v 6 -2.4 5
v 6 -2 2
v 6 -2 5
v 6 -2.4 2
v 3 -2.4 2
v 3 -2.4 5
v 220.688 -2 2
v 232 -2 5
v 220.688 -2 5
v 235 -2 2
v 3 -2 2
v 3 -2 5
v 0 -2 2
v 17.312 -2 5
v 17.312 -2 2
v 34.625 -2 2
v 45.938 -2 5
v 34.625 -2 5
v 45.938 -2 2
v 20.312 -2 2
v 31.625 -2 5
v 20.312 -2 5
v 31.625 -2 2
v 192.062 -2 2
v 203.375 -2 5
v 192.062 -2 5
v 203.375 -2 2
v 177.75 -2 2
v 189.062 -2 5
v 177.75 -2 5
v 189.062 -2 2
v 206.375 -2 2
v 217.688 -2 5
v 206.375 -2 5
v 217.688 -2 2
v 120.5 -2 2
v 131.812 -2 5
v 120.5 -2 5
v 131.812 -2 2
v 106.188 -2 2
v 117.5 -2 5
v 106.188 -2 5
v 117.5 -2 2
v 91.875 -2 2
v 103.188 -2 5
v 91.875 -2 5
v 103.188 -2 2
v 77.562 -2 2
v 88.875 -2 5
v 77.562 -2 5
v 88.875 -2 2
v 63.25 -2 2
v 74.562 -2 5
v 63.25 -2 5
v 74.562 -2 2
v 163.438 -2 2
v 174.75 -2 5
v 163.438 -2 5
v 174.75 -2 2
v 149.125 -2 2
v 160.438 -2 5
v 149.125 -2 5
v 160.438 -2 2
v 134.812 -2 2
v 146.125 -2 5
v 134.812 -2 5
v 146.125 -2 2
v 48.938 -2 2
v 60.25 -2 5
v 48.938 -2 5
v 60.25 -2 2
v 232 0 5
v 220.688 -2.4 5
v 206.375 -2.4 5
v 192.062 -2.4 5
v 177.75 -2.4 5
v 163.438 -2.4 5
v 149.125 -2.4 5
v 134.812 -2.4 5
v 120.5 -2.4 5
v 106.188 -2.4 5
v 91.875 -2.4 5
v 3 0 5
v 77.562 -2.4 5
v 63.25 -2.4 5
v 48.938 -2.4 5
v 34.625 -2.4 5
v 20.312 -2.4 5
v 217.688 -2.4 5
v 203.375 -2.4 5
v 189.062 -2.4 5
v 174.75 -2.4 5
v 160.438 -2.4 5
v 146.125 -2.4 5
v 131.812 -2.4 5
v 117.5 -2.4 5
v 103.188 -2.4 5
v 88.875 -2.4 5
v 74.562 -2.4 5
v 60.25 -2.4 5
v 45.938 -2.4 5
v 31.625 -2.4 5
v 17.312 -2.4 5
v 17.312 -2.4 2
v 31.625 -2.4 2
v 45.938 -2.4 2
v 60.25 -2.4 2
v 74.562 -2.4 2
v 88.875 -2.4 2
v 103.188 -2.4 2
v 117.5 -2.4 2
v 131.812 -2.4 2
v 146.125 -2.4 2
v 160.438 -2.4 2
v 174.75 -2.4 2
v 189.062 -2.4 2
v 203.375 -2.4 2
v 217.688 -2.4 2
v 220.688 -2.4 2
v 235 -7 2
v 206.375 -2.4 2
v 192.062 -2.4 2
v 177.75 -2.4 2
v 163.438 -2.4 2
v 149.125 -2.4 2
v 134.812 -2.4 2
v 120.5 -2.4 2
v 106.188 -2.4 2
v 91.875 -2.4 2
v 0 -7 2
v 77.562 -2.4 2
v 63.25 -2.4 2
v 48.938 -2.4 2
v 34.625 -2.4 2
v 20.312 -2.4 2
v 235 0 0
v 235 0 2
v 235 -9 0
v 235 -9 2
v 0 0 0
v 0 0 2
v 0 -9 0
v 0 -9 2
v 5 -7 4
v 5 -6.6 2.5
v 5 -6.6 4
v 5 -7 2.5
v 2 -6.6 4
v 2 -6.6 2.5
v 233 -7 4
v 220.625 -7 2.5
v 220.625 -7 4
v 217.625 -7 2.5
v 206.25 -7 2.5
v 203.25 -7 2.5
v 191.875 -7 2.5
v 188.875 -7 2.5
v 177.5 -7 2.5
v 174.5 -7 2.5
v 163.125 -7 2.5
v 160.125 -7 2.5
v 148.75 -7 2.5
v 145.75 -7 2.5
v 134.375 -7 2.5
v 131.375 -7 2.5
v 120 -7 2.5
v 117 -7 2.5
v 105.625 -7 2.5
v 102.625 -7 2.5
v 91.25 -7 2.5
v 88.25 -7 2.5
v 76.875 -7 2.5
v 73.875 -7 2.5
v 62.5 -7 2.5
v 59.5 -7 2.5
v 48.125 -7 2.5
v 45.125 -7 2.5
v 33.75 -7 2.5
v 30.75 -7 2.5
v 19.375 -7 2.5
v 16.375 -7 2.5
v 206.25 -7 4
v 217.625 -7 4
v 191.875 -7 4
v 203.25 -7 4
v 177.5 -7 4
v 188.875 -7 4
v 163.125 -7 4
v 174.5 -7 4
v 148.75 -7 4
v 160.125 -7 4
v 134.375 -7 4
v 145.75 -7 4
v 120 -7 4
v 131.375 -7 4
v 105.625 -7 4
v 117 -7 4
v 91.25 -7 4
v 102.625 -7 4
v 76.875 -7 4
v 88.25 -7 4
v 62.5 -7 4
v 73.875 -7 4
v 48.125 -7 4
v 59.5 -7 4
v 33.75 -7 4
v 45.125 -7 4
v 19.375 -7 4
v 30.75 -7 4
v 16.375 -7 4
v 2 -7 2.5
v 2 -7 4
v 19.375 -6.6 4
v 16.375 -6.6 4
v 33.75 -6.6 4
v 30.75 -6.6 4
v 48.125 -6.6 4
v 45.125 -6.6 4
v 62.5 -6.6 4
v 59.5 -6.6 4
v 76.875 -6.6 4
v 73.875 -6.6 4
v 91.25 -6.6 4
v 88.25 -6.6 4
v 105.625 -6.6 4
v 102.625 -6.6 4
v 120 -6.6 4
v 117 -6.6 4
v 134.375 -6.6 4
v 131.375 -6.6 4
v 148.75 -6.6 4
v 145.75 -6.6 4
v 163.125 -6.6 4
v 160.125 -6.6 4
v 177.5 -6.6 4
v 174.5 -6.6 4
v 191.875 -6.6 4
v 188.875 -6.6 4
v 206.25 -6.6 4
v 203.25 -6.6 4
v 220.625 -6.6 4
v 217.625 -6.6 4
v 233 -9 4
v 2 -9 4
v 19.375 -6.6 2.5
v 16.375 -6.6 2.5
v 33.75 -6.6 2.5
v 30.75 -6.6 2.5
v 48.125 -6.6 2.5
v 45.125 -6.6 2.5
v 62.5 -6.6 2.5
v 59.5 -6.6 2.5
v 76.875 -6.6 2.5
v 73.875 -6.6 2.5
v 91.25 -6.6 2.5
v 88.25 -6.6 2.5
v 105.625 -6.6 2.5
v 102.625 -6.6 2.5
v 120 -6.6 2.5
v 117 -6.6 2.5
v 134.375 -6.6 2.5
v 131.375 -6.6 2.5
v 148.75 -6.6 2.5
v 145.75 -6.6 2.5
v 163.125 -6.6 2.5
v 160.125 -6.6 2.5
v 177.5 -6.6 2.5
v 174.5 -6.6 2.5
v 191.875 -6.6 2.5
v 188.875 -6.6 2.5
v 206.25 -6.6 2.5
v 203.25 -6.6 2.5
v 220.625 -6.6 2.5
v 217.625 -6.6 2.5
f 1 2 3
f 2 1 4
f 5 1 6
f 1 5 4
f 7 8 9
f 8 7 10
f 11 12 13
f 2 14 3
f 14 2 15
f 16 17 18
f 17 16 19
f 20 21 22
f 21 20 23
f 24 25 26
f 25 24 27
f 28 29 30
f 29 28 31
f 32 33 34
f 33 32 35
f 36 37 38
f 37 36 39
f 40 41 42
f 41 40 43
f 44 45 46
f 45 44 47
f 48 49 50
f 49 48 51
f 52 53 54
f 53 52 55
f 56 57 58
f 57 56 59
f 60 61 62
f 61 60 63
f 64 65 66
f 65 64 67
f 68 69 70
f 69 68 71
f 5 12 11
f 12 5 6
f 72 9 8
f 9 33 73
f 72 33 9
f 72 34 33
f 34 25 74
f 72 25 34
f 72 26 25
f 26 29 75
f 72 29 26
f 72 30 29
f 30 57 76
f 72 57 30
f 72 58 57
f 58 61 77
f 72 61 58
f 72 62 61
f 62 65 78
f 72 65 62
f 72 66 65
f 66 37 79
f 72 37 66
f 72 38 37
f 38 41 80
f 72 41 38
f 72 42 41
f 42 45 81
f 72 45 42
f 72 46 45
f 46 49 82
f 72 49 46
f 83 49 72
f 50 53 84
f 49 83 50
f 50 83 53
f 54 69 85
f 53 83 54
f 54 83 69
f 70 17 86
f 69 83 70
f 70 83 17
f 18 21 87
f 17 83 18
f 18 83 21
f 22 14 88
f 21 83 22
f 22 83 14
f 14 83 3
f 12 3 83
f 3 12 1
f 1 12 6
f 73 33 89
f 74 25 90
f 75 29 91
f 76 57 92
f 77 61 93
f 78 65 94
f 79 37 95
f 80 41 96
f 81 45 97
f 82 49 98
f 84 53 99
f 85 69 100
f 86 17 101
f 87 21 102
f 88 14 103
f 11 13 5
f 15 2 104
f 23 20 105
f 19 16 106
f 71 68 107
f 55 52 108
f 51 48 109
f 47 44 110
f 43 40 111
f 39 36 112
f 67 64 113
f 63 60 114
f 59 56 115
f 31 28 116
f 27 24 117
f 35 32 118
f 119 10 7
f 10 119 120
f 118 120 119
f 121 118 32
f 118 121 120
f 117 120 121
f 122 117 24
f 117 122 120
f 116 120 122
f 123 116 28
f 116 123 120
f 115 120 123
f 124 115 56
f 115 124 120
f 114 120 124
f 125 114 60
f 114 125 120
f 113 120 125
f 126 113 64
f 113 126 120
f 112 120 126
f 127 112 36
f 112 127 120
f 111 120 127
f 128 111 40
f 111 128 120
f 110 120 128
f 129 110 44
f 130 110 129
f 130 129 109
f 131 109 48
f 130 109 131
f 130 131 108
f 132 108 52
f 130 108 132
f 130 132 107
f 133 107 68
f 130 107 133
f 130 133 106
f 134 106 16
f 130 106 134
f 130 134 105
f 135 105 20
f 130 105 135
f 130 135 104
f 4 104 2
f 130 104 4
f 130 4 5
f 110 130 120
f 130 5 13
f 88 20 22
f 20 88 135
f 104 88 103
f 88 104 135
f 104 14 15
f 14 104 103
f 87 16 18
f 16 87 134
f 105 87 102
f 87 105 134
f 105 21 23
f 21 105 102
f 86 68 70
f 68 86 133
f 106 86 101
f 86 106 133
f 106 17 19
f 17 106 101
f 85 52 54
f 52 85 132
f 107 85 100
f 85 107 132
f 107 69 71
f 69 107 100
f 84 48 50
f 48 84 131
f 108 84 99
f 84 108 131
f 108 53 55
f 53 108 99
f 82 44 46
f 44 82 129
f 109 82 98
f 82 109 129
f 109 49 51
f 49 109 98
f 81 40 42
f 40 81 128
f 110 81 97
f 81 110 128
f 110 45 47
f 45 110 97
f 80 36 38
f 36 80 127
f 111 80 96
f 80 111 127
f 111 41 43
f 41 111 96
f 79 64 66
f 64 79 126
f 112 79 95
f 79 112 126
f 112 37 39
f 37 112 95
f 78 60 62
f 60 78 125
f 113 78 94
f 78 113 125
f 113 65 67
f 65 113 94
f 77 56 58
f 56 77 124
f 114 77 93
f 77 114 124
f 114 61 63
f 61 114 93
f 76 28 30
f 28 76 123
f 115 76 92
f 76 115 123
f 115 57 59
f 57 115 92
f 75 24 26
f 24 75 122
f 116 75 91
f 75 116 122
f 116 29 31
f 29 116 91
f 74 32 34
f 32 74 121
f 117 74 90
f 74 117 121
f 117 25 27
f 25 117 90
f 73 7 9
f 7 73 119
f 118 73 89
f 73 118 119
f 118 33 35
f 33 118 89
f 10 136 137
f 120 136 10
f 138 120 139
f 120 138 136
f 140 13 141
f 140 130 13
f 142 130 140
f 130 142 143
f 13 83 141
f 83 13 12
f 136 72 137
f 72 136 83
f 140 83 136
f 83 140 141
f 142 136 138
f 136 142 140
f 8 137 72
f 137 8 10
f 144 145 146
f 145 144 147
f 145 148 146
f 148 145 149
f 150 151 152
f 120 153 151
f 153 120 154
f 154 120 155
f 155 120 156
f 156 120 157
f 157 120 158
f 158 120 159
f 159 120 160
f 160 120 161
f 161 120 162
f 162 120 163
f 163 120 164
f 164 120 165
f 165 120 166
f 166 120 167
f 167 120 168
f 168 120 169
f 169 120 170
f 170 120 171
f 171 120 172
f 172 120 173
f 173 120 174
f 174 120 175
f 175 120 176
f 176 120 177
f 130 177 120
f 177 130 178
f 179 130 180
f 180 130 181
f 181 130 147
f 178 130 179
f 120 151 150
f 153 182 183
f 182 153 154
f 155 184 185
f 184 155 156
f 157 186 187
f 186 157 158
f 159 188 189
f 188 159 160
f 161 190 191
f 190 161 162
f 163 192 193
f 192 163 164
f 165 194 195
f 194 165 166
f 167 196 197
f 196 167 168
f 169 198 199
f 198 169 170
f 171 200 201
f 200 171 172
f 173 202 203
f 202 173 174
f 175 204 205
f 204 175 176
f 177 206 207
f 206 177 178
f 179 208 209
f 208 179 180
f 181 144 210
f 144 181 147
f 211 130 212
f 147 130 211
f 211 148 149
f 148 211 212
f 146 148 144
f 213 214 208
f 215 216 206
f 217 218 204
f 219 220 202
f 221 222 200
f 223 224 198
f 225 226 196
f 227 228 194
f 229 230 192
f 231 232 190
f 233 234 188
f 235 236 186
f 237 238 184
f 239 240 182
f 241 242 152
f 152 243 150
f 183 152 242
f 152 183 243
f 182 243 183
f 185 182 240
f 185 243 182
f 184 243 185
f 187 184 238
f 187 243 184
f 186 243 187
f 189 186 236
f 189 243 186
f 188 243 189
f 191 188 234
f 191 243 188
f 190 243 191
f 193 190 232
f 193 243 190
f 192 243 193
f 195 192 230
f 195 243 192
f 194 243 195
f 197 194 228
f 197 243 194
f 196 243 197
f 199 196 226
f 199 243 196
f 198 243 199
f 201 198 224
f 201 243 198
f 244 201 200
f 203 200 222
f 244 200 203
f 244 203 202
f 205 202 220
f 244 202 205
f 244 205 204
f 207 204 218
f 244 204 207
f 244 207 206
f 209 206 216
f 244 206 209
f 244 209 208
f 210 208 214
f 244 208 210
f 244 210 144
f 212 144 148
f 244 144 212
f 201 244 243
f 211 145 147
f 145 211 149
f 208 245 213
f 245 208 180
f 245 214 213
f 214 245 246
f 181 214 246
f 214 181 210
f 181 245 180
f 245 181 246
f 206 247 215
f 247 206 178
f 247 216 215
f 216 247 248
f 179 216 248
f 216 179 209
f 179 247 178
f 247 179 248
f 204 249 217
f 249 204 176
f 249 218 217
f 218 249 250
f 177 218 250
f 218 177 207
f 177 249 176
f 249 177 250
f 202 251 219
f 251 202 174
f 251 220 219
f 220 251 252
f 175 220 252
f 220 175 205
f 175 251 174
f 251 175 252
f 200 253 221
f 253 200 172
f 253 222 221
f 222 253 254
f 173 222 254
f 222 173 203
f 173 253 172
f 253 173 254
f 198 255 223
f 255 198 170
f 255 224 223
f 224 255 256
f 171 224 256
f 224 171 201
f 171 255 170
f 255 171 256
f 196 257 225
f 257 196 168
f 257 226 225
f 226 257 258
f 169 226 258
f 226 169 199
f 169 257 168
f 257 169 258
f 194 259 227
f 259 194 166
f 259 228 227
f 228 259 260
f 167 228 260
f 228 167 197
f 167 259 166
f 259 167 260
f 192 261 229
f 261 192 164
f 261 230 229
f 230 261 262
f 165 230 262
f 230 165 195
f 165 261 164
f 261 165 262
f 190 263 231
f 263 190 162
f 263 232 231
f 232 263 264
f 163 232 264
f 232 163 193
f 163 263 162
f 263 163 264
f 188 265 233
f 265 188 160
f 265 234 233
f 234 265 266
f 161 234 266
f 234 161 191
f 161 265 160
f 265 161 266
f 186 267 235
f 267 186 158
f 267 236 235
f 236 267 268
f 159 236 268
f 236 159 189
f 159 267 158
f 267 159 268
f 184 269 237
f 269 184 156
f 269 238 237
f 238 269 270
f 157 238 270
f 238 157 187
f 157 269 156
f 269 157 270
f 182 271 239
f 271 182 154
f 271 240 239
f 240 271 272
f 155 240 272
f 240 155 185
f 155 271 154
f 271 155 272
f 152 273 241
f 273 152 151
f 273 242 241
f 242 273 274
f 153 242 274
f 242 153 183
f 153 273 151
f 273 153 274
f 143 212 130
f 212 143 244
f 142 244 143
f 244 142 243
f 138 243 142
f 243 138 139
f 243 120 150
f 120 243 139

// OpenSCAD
length = 235;
thickness = 2;
depth = 3;
inner_height = 7;

grooves = 16;
groove_height = 0.40;
groove_length = 3;

module flat_bar(length, thickness, depth, grooves, groove_depth, groove_length, groove_height) {
    linear_extrude(height = thickness, slices=0, convexity = 0) {
        polygon([
            [0,0], [0, thickness], [depth, depth + thickness],
            [length - depth, depth + thickness], [length, thickness], [length, 0]
        ]);
    }
    

    for (x = [depth : (length - depth - groove_length)/grooves : length - depth]) {
        if (x + groove_length < length - depth)
          translate([x, thickness + depth - groove_depth, thickness])
            cube([groove_length, groove_depth, groove_height]);
    }

}

rotate([90,0,0])
intersection() {
    union() {
        flat_bar(length, thickness, 3, grooves, depth, groove_length, groove_height);
        translate([0,0,thickness])
          cube([length, thickness, inner_height - thickness]);
        translate([0, 0, thickness + inner_height])
          mirror([0,0,1])
            flat_bar(length, thickness, 2, grooves, depth/2, groove_length, groove_height);
    }
    
}
    
    
